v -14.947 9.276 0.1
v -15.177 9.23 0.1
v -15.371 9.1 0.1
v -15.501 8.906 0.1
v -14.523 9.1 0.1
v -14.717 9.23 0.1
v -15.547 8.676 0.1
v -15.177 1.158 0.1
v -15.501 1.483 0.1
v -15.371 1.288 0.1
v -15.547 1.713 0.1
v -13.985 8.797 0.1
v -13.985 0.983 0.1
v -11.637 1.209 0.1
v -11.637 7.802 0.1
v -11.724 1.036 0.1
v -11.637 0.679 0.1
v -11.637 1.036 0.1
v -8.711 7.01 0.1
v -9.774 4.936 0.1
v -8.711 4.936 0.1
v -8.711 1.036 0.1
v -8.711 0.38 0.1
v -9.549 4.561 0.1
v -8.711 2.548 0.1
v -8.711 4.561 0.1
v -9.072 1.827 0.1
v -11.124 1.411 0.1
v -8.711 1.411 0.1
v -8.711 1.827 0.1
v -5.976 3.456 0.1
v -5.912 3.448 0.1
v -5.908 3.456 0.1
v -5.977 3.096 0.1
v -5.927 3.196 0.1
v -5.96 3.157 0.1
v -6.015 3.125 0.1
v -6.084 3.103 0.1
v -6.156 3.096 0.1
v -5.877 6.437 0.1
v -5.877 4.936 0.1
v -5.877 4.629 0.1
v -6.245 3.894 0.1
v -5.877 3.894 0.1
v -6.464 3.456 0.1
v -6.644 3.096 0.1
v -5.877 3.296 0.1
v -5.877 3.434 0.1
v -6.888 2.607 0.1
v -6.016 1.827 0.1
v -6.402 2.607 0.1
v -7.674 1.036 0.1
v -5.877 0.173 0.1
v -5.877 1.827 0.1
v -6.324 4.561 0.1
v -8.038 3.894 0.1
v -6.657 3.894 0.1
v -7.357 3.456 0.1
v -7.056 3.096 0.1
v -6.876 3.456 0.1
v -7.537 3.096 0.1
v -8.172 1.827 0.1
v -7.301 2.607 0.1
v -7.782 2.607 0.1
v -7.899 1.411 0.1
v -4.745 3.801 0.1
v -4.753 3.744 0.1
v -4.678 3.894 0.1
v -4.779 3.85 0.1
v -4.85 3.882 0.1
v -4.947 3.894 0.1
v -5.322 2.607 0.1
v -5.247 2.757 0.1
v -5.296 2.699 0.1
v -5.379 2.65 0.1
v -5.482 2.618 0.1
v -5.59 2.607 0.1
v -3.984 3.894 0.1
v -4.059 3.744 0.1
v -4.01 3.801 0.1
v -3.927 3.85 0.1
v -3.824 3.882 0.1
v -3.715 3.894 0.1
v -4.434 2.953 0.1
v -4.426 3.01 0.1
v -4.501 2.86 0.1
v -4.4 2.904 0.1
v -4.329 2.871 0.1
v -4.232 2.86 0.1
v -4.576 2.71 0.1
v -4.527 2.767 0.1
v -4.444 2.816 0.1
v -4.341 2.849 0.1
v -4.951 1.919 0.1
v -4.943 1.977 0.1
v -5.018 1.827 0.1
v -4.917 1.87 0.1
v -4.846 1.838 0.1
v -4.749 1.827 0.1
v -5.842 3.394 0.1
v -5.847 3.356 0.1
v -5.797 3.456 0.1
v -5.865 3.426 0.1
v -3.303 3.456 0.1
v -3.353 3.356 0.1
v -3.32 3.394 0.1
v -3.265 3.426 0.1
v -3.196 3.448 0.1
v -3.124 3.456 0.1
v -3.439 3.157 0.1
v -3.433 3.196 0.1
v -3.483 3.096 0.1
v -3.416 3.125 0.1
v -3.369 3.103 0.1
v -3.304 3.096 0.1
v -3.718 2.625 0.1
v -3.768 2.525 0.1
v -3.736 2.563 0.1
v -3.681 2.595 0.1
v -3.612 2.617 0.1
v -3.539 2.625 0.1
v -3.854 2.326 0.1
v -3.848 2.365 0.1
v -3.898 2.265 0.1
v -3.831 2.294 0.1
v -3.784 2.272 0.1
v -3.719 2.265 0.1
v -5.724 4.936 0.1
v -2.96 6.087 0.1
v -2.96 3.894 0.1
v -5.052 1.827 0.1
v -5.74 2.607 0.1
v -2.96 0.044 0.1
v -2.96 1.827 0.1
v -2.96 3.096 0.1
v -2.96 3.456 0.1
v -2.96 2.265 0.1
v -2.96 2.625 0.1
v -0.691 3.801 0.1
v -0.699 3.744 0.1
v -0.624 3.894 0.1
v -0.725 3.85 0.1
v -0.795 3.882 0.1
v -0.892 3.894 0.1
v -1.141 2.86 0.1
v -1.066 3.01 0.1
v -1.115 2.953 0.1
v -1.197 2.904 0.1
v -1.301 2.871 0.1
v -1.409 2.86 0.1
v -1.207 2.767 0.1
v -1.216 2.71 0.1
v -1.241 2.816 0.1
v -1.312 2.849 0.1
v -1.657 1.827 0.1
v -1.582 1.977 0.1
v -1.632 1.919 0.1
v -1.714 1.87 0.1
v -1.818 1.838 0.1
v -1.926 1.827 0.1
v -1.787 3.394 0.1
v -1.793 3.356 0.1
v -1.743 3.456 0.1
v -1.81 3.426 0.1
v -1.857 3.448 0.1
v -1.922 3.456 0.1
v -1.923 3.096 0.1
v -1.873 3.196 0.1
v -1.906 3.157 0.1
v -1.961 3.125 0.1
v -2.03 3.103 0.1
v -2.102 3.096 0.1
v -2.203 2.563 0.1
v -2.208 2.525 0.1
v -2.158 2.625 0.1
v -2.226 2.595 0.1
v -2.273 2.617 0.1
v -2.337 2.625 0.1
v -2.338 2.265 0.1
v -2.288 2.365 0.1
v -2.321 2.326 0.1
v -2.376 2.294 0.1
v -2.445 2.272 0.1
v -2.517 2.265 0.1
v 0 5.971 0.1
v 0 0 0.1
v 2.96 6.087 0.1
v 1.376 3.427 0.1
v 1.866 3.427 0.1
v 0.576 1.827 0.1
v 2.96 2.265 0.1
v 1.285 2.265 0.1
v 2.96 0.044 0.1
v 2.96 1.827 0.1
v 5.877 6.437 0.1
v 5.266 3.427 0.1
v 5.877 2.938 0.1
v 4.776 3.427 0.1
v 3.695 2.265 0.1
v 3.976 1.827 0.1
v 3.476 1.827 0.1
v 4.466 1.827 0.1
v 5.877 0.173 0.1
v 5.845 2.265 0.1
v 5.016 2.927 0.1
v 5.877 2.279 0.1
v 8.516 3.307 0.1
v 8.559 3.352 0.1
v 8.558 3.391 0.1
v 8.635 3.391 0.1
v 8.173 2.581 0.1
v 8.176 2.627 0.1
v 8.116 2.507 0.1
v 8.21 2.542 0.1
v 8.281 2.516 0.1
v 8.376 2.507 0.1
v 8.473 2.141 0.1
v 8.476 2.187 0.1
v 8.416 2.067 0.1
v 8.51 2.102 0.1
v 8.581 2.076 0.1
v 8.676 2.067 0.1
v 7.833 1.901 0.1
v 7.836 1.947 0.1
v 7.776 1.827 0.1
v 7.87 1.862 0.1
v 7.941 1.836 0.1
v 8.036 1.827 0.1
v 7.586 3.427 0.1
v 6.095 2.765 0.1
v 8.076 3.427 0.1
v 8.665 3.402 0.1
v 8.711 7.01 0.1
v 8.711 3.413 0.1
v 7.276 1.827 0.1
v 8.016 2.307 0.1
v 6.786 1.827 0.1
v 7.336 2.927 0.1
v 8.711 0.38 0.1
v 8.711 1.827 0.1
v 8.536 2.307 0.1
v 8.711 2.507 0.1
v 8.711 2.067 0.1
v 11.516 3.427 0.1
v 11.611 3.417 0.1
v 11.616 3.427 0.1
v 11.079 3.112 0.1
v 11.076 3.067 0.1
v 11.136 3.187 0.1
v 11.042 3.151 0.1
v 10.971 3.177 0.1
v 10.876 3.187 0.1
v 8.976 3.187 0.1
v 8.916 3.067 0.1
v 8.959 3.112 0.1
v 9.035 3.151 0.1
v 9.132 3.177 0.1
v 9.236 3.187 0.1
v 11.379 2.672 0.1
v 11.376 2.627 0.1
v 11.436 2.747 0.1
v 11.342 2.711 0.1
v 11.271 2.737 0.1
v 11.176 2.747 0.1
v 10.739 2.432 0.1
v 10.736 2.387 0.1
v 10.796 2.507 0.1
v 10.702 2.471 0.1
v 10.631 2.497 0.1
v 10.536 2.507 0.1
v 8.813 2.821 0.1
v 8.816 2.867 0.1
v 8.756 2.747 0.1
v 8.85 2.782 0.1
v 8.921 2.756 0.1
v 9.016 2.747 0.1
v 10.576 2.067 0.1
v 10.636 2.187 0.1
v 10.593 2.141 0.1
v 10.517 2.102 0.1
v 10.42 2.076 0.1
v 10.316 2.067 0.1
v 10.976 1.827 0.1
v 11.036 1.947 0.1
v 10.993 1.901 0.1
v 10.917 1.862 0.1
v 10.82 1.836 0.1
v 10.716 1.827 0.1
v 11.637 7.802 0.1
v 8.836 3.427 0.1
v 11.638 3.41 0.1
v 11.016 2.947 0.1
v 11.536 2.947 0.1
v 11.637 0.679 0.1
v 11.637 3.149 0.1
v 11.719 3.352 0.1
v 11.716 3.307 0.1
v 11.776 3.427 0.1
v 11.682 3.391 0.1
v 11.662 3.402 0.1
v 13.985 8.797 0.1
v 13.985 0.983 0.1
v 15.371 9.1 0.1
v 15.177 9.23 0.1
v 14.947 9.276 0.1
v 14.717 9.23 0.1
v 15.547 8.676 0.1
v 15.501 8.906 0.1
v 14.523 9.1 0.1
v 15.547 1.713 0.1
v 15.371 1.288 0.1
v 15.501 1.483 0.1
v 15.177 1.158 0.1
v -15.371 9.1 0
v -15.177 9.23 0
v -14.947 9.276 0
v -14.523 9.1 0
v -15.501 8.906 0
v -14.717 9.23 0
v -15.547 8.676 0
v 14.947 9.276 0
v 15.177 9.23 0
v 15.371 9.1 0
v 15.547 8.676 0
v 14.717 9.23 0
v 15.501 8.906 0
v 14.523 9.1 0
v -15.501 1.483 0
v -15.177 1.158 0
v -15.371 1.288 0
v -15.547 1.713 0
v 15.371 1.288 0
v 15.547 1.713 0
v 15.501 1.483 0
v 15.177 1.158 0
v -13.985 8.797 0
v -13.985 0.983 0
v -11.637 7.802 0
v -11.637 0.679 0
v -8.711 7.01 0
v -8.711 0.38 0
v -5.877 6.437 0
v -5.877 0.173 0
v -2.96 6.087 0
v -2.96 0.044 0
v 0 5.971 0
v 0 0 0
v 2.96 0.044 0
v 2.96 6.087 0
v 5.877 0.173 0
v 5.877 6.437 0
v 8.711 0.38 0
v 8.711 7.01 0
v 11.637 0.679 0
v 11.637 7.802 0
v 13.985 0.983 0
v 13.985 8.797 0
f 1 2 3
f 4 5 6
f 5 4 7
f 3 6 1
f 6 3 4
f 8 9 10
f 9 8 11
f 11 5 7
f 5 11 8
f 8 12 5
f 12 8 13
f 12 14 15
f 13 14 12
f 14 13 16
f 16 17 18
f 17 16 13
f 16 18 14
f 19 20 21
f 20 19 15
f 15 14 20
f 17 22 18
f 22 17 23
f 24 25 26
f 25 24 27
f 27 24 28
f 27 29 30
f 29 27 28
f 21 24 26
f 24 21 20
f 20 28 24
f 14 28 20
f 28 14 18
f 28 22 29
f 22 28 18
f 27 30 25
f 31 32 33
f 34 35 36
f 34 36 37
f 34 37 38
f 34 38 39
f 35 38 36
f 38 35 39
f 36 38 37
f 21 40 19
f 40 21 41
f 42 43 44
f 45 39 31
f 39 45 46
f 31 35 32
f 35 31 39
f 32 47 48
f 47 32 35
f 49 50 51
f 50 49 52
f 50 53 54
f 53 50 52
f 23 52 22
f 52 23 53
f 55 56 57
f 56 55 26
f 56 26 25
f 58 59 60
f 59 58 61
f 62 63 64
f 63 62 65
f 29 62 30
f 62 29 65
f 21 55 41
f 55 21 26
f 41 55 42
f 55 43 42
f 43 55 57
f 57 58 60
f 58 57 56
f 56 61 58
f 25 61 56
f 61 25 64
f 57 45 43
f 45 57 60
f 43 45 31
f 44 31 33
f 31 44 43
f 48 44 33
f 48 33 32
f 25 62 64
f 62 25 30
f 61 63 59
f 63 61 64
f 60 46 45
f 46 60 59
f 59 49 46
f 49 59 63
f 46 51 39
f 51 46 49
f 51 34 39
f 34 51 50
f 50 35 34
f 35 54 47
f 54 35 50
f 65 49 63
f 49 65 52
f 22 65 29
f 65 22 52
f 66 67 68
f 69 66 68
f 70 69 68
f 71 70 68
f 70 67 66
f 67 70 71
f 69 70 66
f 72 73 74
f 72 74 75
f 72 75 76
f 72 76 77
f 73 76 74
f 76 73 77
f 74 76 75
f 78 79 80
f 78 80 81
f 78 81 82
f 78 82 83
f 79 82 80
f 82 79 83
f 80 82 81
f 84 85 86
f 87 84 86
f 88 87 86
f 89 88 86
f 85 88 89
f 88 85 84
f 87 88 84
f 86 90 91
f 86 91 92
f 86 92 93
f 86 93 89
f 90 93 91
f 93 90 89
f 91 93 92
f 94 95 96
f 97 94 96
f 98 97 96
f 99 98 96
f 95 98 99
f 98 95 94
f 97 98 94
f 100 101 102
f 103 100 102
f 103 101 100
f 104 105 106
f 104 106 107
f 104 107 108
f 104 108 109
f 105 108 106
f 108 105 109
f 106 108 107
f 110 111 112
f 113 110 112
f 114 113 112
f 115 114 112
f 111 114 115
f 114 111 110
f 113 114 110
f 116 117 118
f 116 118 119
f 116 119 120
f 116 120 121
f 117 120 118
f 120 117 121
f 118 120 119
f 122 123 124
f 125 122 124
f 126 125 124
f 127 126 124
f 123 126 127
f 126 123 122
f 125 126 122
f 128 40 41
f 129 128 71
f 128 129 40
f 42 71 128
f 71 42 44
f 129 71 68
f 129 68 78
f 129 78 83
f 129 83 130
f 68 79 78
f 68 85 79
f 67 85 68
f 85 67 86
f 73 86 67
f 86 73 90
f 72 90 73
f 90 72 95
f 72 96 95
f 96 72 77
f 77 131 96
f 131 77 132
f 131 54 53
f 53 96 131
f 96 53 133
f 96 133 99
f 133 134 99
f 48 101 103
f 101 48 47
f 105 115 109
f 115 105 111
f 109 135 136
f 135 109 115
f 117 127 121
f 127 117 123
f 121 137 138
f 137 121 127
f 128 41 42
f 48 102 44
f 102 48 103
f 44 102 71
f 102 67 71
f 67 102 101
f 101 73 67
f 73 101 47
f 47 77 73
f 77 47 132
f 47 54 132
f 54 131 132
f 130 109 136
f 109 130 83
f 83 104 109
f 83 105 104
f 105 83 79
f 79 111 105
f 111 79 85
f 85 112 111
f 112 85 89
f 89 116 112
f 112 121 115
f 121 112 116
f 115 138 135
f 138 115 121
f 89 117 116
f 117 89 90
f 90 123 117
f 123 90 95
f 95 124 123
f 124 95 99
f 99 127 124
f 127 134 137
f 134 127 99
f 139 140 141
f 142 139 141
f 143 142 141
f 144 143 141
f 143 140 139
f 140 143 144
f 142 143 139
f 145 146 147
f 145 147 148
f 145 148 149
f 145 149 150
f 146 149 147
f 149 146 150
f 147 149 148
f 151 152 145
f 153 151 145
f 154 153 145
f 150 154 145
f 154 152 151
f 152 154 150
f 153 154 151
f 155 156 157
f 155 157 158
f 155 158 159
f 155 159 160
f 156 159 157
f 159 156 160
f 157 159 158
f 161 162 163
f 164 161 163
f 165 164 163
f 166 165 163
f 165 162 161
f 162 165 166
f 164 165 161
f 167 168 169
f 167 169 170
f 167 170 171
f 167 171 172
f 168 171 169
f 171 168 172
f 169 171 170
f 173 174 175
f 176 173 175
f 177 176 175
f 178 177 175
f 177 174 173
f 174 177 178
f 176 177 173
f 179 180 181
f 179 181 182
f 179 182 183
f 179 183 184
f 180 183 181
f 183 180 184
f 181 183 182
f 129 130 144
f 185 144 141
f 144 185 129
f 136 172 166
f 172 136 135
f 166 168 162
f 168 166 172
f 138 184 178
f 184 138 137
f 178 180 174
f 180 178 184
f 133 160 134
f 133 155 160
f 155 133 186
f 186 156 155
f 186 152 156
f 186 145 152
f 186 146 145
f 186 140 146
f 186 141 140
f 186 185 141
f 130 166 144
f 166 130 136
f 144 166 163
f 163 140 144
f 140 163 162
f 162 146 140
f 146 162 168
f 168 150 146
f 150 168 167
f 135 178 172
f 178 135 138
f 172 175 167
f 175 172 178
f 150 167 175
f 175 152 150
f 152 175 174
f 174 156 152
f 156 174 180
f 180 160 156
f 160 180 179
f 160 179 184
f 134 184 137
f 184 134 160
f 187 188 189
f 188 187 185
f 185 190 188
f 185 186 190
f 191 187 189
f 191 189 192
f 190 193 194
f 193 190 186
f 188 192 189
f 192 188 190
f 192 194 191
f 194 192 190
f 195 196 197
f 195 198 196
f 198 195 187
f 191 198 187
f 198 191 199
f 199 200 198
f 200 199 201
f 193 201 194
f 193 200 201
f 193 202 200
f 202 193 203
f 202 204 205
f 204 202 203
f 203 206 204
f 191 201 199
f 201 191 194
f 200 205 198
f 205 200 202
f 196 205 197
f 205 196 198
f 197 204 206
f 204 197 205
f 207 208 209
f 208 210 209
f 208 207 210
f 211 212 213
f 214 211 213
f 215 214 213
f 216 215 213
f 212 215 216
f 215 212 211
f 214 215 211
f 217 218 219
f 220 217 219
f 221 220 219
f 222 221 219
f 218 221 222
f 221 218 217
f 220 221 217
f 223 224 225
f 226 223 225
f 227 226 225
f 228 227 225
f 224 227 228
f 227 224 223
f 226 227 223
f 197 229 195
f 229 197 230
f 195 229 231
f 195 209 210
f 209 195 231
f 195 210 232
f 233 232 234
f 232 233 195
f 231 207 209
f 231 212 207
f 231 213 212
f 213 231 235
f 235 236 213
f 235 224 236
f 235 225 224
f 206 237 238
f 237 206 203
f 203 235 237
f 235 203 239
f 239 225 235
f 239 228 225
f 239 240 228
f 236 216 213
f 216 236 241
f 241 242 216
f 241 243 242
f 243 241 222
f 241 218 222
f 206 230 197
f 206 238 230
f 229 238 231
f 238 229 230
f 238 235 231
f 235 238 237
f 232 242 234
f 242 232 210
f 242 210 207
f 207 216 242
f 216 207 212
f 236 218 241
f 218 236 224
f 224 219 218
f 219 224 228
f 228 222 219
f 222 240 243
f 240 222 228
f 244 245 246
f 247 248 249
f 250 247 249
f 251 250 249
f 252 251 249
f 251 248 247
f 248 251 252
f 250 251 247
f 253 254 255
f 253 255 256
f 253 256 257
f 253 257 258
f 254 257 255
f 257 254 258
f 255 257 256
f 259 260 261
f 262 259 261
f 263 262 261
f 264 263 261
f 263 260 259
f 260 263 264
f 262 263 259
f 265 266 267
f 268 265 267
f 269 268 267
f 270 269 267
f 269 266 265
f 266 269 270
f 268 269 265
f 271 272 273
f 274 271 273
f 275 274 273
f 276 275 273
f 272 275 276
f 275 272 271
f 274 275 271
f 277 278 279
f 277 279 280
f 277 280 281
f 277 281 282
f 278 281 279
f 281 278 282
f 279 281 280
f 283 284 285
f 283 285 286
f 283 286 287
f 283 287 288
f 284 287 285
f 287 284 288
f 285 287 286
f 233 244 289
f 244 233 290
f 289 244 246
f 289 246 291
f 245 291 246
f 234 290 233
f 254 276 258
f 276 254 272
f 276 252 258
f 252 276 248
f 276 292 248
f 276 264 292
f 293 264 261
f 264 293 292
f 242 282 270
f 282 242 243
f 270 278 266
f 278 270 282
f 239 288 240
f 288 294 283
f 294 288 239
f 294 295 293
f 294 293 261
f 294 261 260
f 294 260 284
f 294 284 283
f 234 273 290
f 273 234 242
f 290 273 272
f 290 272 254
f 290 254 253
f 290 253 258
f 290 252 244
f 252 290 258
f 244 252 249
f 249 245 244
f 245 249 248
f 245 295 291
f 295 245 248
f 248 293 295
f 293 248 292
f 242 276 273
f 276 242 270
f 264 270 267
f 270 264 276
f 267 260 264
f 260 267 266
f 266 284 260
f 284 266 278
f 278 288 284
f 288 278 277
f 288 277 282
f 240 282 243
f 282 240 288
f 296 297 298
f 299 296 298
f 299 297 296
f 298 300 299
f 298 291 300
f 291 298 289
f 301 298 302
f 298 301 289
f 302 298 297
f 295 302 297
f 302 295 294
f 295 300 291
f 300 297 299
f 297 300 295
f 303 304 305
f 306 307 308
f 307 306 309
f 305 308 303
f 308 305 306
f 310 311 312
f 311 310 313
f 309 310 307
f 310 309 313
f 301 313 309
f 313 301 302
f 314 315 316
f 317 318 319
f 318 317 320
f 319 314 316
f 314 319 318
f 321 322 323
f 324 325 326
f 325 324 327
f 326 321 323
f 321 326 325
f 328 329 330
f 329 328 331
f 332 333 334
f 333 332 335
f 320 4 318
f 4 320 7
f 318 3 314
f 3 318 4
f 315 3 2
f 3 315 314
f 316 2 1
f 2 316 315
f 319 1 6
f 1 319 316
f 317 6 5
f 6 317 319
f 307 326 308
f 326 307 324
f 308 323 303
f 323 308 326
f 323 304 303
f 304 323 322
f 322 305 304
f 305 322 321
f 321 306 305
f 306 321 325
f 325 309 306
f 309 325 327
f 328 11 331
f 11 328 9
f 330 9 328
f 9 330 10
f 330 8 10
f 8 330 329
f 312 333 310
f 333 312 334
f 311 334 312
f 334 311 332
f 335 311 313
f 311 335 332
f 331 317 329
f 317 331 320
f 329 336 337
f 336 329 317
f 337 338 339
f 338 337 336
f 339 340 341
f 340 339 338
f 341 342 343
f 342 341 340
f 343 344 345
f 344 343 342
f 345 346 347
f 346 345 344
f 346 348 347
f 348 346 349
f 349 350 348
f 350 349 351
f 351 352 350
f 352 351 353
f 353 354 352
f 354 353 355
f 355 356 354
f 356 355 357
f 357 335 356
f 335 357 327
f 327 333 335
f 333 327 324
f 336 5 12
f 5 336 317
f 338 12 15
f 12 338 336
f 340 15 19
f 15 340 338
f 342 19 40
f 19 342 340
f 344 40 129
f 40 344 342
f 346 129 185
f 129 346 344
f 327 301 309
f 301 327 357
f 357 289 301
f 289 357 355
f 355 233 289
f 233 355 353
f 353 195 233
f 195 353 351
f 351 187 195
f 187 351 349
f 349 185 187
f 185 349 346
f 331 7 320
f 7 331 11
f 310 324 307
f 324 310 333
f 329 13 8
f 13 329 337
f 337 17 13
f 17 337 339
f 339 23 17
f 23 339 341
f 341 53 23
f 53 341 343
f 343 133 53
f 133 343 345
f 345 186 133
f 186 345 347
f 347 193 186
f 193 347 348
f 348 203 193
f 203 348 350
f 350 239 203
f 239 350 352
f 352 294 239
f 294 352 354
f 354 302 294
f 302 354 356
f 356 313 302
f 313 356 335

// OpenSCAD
use <../lib.scad>
use <s/6142271rs01.scad>
use <s/6142271rs02.scad>
use <s/6142271rs03.scad>
use <s/6142271rs04.scad>
use <s/6142271rs05.scad>
use <s/6142271rs06.scad>
use <s/6142271rs07.scad>
use <s/6142271rs08.scad>
use <s/6142271rs09.scad>
use <s/6142271rs10.scad>
use <s/6142271rs11.scad>
use <s/6142271rs12.scad>
function ldraw_lib__6142271r() = [
// 0 Sticker  1.2 x  3.9 with R8 LMS Logo on Black Background
// 0 Name: 6142271r.dat
// 0 Author: Massimo Maso [Sirio]
// 0 !LDRAW_ORG Part UPDATE 2025-02
// 0 !LICENSE Licensed under CC BY 4.0 : see CAreadme.txt
// 
// 0 BFC CERTIFY CCW
  [0,"BFC","CERTIFY"],
  [0,"BFC","CCW"],
// 
// 0 !KEYWORDS Audi, Bricklink 75873stk01a, Brickowl 427960, Rebrickable 24755
// 0 !KEYWORDS Set 75873, Speed Champions, Ultra
// 
// 0 !HISTORY 2025-02-27 [OrionP] Official Update 2025-02
// 
// 
// 1 16 -34.9686 0 0 1 0 0 0 1 0 0 0 1 s\6142271rs01.dat
  [1,16,-34.9686,0,0,1,0,0,0,1,0,0,0,1, ldraw_lib__s__6142271rs01()],
// 1 16 -34.9564 0 0 1 0 0 0 1 0 0 0 1 s\6142271rs02.dat
  [1,16,-34.9564,0,0,1,0,0,0,1,0,0,0,1, ldraw_lib__s__6142271rs02()],
// 1 16 -21.7843 0 0 1 0 0 0 1 0 0 0 1 s\6142271rs03.dat
  [1,16,-21.7843,0,0,1,0,0,0,1,0,0,0,1, ldraw_lib__s__6142271rs03()],
// 1 16 -21.7719 0 0 1 0 0 0 1 0 0 0 1 s\6142271rs04.dat
  [1,16,-21.7719,0,0,1,0,0,0,1,0,0,0,1, ldraw_lib__s__6142271rs04()],
// 1 16 -7.4065 0 0 1 0 0 0 1 0 0 0 1 s\6142271rs05.dat
  [1,16,-7.4065,0,0,1,0,0,0,1,0,0,0,1, ldraw_lib__s__6142271rs05()],
// 1 16 -7.3931 0 0 1 0 0 0 1 0 0 0 1 s\6142271rs06.dat
  [1,16,-7.3931,0,0,1,0,0,0,1,0,0,0,1, ldraw_lib__s__6142271rs06()],
// 1 16 7.3931 0 0 1 0 0 0 1 0 0 0 1 s\6142271rs07.dat
  [1,16,7.3931,0,0,1,0,0,0,1,0,0,0,1, ldraw_lib__s__6142271rs07()],
// 1 16 7.4065 0 0 1 0 0 0 1 0 0 0 1 s\6142271rs08.dat
  [1,16,7.4065,0,0,1,0,0,0,1,0,0,0,1, ldraw_lib__s__6142271rs08()],
// 1 16 21.7719 0 0 1 0 0 0 1 0 0 0 1 s\6142271rs09.dat
  [1,16,21.7719,0,0,1,0,0,0,1,0,0,0,1, ldraw_lib__s__6142271rs09()],
// 1 16 21.7843 0 0 1 0 0 0 1 0 0 0 1 s\6142271rs10.dat
  [1,16,21.7843,0,0,1,0,0,0,1,0,0,0,1, ldraw_lib__s__6142271rs10()],
// 1 16 34.9564 0 0 1 0 0 0 1 0 0 0 1 s\6142271rs11.dat
  [1,16,34.9564,0,0,1,0,0,0,1,0,0,0,1, ldraw_lib__s__6142271rs11()],
// 1 16 34.9686 0 0 -1 0 0 0 1 0 0 0 1 s\6142271rs01.dat
  [1,16,34.9686,0,0,-1,0,0,0,1,0,0,0,1, ldraw_lib__s__6142271rs01()],
// 1 16 0 0 0 1 0 0 0 1 0 0 0 1 s\6142271rs12.dat
  [1,16,0,0,0,1,0,0,0,1,0,0,0,1, ldraw_lib__s__6142271rs12()],
];
module ldraw_lib__6142271r(step=0, col=false, unit=2/5, alt=false, line=0.2, solid=!$preview)
    makepoly(ldraw_lib__6142271r(), step=step, col=col, unit=unit, alt=alt, line=line, solid=solid);
ldraw_lib__6142271r(line=0.2);
